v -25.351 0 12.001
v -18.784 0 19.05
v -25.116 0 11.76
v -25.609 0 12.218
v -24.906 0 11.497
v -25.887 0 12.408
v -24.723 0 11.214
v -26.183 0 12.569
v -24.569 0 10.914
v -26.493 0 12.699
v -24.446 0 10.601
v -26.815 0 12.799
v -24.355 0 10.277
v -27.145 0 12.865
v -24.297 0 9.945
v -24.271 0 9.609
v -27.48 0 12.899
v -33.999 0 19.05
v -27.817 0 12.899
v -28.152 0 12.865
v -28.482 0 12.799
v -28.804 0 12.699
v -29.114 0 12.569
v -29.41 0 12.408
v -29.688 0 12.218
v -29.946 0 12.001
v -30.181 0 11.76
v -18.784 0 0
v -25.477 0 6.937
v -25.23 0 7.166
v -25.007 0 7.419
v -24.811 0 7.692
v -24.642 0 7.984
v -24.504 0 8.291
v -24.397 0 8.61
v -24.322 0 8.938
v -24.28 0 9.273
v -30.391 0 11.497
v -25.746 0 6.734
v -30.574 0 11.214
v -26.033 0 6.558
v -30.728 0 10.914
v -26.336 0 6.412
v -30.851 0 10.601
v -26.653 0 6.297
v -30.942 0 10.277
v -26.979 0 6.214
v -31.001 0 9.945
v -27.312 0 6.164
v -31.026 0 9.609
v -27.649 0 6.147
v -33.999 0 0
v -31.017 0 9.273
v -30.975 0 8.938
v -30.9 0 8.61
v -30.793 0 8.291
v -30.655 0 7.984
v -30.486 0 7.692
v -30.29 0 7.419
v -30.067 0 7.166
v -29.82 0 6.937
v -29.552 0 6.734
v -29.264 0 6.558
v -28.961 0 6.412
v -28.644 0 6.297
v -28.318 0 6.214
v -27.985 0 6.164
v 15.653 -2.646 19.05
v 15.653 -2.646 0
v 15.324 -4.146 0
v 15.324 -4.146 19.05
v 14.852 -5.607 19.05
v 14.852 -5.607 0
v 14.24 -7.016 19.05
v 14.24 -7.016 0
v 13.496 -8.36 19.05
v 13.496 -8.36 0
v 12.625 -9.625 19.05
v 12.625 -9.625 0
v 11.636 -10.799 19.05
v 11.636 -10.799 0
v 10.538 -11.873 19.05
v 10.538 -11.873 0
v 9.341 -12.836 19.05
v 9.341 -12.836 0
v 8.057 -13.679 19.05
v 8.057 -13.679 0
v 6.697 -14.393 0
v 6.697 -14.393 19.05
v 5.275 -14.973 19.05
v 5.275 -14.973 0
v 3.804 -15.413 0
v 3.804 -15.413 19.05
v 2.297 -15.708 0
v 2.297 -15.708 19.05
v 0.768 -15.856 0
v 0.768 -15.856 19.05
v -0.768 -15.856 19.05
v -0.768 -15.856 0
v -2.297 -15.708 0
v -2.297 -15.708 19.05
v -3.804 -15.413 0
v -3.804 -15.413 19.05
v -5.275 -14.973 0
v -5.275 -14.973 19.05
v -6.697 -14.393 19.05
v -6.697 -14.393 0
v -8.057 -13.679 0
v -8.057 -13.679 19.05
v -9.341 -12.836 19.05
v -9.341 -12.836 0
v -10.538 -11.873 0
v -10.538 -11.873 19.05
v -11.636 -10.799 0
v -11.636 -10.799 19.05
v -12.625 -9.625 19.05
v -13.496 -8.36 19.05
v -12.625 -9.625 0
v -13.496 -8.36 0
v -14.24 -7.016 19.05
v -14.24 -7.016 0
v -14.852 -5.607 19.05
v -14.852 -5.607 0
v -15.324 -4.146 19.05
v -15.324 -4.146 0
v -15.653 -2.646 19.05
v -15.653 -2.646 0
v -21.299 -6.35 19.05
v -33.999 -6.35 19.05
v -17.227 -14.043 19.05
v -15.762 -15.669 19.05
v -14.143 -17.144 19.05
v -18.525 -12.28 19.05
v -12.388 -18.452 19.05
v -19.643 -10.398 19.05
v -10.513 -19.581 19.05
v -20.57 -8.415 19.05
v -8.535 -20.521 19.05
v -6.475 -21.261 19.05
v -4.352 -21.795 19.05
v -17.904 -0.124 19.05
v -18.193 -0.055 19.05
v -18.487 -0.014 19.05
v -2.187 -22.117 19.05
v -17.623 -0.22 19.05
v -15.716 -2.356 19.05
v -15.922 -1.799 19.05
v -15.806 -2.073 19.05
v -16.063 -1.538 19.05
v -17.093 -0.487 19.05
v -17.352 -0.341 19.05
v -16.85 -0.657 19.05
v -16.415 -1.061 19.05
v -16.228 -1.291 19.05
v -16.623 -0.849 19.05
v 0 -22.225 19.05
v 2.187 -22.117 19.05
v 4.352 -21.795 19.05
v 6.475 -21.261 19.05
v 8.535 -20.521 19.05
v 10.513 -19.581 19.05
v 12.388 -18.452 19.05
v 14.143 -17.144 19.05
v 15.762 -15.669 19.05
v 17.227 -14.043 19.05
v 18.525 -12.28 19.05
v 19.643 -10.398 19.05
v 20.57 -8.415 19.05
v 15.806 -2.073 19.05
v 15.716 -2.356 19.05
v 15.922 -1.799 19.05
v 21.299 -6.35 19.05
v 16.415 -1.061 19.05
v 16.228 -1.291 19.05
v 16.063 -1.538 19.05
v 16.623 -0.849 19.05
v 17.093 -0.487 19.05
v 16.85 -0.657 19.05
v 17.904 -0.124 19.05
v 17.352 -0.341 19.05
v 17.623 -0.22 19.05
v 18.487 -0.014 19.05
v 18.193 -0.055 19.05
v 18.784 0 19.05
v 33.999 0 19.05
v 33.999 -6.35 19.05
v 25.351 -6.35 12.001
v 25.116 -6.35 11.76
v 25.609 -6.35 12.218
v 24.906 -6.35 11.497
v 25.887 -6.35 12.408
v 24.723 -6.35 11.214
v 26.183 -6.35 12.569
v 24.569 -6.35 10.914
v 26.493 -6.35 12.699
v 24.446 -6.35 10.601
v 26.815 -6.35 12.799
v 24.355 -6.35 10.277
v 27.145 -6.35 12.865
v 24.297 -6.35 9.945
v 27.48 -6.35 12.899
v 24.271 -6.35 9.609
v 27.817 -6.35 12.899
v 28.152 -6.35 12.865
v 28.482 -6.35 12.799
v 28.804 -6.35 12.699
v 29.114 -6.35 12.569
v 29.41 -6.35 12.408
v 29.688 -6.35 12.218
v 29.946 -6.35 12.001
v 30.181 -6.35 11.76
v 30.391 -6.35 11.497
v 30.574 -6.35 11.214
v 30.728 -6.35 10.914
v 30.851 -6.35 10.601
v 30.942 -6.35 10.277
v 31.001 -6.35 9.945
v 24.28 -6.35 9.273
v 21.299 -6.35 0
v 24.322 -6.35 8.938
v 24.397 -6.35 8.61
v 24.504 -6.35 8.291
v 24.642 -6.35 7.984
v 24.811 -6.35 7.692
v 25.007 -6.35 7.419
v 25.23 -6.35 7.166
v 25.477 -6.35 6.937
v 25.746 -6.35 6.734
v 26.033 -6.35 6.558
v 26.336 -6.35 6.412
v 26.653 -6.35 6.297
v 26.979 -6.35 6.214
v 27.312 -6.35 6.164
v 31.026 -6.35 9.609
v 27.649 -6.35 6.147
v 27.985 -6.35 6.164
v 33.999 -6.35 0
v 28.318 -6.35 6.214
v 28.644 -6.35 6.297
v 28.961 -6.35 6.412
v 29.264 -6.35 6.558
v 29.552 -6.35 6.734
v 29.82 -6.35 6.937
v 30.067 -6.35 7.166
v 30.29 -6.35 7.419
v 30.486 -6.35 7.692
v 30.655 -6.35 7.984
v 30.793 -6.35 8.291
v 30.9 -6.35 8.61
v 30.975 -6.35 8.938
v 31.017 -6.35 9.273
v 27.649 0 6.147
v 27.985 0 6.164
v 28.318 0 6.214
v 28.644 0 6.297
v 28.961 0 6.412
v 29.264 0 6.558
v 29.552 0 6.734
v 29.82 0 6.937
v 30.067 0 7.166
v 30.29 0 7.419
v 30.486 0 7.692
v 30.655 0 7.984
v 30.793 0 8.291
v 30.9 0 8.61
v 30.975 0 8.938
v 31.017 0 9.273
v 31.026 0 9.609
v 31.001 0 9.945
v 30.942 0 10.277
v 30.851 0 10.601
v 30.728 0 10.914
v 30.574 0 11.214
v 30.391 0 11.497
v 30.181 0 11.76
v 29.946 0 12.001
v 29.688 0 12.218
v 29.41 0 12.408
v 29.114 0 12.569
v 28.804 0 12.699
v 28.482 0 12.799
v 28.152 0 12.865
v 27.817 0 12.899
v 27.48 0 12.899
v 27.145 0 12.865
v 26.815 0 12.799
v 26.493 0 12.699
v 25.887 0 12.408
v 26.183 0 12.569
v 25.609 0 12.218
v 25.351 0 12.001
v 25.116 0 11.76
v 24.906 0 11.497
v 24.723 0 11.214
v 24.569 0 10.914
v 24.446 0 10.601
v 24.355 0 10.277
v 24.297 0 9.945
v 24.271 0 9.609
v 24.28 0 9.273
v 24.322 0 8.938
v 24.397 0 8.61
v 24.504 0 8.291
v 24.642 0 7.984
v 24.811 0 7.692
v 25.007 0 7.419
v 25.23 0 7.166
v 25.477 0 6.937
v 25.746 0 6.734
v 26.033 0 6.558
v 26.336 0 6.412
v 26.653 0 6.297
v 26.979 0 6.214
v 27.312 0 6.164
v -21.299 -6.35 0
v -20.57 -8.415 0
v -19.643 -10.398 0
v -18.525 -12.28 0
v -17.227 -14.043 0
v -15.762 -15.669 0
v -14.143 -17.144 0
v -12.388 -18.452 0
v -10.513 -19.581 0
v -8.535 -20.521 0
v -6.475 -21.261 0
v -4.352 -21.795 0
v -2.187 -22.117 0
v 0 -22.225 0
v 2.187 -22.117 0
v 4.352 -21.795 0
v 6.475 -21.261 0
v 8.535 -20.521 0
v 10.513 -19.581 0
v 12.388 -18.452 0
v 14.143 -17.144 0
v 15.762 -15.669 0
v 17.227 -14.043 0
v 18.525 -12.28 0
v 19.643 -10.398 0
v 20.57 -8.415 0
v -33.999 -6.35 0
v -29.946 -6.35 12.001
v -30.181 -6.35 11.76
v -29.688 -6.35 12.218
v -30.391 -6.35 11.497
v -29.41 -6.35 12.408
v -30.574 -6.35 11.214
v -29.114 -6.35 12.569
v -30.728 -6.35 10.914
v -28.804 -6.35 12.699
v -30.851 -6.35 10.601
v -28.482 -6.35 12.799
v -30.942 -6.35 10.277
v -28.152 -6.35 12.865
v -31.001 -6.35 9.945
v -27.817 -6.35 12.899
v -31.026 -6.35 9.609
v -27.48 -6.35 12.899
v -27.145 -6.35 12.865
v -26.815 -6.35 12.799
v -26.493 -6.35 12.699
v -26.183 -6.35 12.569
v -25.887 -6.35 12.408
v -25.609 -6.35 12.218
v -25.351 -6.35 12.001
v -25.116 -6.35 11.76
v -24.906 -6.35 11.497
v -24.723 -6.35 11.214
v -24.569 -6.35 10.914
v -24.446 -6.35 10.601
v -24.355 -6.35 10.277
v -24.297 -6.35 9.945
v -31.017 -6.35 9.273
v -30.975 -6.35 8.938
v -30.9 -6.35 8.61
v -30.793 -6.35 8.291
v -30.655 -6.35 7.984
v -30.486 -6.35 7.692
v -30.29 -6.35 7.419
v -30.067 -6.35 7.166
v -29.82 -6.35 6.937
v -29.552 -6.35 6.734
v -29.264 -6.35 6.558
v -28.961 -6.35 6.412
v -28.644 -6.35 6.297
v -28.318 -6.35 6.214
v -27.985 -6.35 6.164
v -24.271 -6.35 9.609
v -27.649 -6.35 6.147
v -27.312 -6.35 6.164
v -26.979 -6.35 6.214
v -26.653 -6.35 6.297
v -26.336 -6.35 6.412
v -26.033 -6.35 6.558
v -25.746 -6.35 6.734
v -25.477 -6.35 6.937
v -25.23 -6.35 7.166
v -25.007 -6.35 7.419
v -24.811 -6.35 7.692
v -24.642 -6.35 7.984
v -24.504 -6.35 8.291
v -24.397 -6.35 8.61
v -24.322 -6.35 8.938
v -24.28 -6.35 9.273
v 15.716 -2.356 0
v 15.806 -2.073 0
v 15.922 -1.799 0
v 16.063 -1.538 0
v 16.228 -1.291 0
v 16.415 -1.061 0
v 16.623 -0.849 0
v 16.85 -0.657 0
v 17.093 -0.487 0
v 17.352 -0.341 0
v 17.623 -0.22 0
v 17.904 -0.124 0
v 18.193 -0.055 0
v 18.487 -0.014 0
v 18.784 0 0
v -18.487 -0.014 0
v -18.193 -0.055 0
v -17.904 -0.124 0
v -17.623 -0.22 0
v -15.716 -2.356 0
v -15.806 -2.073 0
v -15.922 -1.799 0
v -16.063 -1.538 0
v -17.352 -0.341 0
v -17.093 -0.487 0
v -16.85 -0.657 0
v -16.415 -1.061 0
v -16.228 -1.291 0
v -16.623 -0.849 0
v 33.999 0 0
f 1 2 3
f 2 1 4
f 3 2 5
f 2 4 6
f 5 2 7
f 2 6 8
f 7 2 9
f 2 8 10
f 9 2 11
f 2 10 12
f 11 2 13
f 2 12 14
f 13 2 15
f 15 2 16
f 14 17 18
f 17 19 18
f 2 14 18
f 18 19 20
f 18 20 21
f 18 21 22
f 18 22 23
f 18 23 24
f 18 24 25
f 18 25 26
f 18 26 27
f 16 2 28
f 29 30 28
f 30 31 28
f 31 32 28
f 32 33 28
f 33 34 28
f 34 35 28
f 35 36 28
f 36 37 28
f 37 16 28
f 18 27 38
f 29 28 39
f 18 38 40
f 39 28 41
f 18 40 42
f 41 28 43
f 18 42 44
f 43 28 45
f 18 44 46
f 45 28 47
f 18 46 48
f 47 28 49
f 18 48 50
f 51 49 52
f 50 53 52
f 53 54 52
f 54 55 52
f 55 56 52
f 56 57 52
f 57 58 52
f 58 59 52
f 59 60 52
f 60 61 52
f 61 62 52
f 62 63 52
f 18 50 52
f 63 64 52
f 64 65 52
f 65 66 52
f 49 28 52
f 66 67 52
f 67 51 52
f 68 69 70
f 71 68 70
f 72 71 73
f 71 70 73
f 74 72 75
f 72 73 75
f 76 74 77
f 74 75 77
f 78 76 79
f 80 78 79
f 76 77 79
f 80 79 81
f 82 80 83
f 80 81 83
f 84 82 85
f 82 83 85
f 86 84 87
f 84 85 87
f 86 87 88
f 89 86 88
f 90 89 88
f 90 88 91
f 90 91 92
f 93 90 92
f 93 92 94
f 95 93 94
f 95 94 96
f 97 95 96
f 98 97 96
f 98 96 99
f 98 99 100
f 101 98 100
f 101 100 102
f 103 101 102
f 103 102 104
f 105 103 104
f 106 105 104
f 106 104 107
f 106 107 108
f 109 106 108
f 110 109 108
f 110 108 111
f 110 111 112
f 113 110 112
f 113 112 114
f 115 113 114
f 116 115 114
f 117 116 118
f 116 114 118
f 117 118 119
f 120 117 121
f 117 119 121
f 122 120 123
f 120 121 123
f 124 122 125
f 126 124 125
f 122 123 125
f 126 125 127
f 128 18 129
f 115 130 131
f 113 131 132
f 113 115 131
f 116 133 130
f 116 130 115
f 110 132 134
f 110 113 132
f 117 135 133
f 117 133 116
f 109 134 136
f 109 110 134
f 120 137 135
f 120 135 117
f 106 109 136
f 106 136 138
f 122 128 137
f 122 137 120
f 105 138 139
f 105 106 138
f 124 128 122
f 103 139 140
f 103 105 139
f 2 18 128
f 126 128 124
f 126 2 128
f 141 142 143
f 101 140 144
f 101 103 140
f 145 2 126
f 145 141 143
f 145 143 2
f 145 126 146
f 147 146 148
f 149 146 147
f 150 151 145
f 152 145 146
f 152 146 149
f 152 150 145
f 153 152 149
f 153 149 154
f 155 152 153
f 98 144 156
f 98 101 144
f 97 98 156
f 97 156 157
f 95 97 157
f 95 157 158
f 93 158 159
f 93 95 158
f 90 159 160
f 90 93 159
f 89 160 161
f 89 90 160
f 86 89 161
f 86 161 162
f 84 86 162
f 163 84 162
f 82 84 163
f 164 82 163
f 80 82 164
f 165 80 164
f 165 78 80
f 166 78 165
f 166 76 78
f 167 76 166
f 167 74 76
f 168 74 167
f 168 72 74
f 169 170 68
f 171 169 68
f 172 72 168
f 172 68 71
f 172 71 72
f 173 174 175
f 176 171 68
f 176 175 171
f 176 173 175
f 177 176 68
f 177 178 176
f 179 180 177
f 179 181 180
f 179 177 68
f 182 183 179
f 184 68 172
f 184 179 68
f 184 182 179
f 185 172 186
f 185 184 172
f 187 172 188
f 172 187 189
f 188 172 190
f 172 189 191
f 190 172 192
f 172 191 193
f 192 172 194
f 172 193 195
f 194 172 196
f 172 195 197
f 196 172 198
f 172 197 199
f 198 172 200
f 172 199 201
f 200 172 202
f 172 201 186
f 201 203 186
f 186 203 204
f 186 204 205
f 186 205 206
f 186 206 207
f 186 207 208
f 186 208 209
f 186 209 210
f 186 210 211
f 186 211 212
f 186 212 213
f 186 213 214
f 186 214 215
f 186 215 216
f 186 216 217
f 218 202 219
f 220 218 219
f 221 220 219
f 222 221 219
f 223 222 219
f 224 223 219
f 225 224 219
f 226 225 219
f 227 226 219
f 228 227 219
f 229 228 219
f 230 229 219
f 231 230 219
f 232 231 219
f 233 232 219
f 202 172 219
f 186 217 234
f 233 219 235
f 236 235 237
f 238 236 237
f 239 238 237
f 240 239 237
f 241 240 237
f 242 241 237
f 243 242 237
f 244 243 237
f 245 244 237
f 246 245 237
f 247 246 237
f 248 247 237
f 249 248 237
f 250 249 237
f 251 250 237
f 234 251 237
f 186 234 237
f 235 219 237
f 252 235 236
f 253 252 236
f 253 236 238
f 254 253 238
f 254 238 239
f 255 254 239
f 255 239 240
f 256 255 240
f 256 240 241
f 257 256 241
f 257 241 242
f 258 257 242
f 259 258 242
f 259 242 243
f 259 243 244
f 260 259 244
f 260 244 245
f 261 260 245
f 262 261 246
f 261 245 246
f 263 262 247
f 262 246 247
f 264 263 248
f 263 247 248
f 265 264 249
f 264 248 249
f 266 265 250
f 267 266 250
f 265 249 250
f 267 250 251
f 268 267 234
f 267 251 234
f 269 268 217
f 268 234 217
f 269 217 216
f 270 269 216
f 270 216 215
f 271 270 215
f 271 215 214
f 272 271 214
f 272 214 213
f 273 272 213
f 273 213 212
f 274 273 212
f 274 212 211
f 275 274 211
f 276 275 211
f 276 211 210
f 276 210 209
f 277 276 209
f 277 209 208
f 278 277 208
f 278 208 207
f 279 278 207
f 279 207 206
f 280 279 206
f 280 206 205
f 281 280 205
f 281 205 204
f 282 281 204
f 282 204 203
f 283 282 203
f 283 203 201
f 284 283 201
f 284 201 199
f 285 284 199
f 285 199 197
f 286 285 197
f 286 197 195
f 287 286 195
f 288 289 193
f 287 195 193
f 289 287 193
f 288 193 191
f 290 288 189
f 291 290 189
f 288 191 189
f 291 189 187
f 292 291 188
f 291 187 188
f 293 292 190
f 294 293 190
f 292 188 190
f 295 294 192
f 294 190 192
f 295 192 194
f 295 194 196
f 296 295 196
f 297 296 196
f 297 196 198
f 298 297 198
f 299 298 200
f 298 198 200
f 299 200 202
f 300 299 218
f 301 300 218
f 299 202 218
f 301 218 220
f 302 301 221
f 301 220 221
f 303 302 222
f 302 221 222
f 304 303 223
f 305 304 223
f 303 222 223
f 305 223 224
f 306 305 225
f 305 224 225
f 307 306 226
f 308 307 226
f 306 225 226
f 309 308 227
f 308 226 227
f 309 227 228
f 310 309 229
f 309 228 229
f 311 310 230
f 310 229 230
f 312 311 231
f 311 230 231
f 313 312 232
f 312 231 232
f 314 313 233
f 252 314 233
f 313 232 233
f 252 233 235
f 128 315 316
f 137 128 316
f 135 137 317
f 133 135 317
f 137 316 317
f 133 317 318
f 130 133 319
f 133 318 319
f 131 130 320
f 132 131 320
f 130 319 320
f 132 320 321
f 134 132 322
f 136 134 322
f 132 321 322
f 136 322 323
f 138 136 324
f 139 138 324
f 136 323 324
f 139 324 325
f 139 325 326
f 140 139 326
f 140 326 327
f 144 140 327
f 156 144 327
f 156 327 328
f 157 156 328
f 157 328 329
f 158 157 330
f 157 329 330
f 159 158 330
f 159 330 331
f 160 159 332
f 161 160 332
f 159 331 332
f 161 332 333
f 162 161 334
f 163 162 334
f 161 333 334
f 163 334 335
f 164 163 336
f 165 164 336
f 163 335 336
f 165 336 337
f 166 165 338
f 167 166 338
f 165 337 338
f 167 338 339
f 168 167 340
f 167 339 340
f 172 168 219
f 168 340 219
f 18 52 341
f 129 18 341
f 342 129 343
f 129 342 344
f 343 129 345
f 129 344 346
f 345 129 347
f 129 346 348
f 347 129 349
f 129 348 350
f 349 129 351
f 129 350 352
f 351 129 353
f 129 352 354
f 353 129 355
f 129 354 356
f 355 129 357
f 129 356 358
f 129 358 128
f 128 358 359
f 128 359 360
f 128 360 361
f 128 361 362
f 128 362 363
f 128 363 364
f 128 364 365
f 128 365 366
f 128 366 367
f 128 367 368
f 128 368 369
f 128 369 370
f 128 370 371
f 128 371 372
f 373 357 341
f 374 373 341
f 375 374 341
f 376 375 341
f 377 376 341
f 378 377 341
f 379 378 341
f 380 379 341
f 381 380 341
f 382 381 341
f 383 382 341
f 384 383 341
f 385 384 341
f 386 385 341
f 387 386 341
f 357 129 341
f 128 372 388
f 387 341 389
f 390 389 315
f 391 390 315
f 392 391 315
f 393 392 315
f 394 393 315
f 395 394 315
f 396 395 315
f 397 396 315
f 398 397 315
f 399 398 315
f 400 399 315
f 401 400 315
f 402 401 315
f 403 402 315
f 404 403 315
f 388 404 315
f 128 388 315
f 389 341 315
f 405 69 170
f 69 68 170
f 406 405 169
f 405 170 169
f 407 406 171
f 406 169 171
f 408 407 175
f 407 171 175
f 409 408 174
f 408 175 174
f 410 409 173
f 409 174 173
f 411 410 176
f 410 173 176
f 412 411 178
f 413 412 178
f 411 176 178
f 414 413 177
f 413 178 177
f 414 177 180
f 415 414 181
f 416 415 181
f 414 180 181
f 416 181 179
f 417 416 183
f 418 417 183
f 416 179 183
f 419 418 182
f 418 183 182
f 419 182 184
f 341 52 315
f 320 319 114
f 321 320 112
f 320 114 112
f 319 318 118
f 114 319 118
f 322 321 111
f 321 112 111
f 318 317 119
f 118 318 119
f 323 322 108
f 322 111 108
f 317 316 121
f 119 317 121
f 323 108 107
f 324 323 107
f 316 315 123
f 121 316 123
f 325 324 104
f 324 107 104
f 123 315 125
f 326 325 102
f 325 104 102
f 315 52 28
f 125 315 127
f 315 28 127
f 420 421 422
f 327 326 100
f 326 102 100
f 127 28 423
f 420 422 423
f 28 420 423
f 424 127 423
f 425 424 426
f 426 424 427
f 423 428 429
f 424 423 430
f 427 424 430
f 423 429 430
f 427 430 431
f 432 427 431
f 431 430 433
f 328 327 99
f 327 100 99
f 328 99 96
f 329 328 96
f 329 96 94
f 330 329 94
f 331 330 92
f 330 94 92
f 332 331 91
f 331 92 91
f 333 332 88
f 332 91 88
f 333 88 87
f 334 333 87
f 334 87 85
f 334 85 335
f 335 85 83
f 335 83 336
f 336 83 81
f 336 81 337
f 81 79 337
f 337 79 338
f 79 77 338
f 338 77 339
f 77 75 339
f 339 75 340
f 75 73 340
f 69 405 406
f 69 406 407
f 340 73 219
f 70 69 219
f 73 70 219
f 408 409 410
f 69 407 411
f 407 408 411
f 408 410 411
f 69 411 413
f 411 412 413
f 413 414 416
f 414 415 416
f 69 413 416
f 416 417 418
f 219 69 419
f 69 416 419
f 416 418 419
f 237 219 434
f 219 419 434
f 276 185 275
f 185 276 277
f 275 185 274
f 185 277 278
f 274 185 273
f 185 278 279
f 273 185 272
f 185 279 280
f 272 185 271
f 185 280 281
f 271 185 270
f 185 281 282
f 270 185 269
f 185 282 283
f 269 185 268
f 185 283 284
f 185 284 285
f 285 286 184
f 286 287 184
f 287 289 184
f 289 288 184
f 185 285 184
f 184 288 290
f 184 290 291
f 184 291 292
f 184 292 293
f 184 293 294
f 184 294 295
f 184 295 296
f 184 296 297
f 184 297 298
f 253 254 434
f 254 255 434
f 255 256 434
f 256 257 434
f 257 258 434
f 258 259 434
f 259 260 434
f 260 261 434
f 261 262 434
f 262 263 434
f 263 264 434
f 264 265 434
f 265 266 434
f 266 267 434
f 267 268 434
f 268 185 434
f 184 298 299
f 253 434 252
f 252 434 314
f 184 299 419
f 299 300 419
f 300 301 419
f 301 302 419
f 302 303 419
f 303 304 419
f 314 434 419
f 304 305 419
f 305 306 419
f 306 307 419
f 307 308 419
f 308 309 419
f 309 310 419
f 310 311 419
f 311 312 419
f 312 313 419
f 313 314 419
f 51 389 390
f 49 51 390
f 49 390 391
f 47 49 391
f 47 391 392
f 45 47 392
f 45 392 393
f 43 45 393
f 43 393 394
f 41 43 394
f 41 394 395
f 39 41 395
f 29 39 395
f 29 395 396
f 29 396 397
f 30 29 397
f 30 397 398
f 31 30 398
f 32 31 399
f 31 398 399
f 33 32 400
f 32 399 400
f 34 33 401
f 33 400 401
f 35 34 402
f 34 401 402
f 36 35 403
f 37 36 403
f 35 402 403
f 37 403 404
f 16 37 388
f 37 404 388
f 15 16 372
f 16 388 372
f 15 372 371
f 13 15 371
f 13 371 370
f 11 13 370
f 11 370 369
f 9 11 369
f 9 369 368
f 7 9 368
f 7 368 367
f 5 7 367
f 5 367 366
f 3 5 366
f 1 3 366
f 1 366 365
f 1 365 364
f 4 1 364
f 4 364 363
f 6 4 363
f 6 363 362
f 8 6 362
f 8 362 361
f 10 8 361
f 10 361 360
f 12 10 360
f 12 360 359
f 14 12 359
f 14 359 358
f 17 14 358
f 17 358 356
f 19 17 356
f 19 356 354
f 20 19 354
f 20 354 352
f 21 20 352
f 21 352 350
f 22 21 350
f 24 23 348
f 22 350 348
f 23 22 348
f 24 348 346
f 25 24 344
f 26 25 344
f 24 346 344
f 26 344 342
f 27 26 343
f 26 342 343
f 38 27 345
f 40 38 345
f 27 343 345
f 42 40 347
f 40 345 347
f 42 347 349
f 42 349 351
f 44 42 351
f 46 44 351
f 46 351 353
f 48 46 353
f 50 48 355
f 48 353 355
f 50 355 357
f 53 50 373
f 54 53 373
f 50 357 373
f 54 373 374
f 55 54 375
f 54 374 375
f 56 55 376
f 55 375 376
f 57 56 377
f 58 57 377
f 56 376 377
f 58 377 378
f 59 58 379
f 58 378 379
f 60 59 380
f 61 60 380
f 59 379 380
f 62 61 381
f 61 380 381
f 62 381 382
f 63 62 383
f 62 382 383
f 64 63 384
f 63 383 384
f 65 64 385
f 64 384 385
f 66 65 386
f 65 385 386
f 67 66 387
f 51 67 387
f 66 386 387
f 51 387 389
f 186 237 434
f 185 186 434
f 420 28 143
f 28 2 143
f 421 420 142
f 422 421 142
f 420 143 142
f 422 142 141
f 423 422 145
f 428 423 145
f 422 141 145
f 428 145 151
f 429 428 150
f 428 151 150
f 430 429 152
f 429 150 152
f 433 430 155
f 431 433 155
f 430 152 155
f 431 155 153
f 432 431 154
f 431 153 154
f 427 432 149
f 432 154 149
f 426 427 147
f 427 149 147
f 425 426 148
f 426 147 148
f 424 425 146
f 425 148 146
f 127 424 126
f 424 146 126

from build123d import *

# Parameters (mm, degrees)
BOSS_EXTRUDE1_DEPTH = 19.05
SKETCH2_R           = 3.3782
CUT_EXTRUDE1_DEPTH  = 43.081104502
FILLET1_R           = 3.175


with BuildPart() as part:
    # Sketch1 → Boss-Extrude1 (new body)
    with BuildSketch(Plane.XY):
        with BuildLine():
            Line((-15.875, 0), (-33.998547486, 0))
            Line((-33.998547486, 0), (-33.998547486, -6.35))
            Line((-33.998547486, -6.35), (-21.298547486, -6.35))
            ThreePointArc((-21.298547486, -6.35), (0, -22.225), (21.298547486, -6.35))
            Line((21.298547486, -6.35), (33.998547486, -6.35))
            Line((33.998547486, -6.35), (33.998547486, 0))
            Line((33.998547486, 0), (15.875, 0))
            ThreePointArc((15.875, 0), (0, -15.875), (-15.875, 0))
        make_face()
    extrude(amount=BOSS_EXTRUDE1_DEPTH)

    # Sketch2 → Cut-Extrude1 (cut, through all)
    with BuildSketch(Plane.XZ.offset(6.35)):
        with Locations(Location((27.648547486, 9.525, 0), (0, 0, 270))):
            Circle(SKETCH2_R)
        with Locations(Location((-27.648547486, 9.525, 0), (0, 0, 270))):
            Circle(SKETCH2_R)
    extrude(amount=-CUT_EXTRUDE1_DEPTH, mode=Mode.SUBTRACT)

    # Fillet1
    fillet1_edges = [part.edges().sort_by_distance(p)[0] for p in [
        (15.875, 0, 9.525),
        (-15.875, 0, 9.525),
    ]]
    fillet(fillet1_edges, radius=FILLET1_R)


solid = part.part
